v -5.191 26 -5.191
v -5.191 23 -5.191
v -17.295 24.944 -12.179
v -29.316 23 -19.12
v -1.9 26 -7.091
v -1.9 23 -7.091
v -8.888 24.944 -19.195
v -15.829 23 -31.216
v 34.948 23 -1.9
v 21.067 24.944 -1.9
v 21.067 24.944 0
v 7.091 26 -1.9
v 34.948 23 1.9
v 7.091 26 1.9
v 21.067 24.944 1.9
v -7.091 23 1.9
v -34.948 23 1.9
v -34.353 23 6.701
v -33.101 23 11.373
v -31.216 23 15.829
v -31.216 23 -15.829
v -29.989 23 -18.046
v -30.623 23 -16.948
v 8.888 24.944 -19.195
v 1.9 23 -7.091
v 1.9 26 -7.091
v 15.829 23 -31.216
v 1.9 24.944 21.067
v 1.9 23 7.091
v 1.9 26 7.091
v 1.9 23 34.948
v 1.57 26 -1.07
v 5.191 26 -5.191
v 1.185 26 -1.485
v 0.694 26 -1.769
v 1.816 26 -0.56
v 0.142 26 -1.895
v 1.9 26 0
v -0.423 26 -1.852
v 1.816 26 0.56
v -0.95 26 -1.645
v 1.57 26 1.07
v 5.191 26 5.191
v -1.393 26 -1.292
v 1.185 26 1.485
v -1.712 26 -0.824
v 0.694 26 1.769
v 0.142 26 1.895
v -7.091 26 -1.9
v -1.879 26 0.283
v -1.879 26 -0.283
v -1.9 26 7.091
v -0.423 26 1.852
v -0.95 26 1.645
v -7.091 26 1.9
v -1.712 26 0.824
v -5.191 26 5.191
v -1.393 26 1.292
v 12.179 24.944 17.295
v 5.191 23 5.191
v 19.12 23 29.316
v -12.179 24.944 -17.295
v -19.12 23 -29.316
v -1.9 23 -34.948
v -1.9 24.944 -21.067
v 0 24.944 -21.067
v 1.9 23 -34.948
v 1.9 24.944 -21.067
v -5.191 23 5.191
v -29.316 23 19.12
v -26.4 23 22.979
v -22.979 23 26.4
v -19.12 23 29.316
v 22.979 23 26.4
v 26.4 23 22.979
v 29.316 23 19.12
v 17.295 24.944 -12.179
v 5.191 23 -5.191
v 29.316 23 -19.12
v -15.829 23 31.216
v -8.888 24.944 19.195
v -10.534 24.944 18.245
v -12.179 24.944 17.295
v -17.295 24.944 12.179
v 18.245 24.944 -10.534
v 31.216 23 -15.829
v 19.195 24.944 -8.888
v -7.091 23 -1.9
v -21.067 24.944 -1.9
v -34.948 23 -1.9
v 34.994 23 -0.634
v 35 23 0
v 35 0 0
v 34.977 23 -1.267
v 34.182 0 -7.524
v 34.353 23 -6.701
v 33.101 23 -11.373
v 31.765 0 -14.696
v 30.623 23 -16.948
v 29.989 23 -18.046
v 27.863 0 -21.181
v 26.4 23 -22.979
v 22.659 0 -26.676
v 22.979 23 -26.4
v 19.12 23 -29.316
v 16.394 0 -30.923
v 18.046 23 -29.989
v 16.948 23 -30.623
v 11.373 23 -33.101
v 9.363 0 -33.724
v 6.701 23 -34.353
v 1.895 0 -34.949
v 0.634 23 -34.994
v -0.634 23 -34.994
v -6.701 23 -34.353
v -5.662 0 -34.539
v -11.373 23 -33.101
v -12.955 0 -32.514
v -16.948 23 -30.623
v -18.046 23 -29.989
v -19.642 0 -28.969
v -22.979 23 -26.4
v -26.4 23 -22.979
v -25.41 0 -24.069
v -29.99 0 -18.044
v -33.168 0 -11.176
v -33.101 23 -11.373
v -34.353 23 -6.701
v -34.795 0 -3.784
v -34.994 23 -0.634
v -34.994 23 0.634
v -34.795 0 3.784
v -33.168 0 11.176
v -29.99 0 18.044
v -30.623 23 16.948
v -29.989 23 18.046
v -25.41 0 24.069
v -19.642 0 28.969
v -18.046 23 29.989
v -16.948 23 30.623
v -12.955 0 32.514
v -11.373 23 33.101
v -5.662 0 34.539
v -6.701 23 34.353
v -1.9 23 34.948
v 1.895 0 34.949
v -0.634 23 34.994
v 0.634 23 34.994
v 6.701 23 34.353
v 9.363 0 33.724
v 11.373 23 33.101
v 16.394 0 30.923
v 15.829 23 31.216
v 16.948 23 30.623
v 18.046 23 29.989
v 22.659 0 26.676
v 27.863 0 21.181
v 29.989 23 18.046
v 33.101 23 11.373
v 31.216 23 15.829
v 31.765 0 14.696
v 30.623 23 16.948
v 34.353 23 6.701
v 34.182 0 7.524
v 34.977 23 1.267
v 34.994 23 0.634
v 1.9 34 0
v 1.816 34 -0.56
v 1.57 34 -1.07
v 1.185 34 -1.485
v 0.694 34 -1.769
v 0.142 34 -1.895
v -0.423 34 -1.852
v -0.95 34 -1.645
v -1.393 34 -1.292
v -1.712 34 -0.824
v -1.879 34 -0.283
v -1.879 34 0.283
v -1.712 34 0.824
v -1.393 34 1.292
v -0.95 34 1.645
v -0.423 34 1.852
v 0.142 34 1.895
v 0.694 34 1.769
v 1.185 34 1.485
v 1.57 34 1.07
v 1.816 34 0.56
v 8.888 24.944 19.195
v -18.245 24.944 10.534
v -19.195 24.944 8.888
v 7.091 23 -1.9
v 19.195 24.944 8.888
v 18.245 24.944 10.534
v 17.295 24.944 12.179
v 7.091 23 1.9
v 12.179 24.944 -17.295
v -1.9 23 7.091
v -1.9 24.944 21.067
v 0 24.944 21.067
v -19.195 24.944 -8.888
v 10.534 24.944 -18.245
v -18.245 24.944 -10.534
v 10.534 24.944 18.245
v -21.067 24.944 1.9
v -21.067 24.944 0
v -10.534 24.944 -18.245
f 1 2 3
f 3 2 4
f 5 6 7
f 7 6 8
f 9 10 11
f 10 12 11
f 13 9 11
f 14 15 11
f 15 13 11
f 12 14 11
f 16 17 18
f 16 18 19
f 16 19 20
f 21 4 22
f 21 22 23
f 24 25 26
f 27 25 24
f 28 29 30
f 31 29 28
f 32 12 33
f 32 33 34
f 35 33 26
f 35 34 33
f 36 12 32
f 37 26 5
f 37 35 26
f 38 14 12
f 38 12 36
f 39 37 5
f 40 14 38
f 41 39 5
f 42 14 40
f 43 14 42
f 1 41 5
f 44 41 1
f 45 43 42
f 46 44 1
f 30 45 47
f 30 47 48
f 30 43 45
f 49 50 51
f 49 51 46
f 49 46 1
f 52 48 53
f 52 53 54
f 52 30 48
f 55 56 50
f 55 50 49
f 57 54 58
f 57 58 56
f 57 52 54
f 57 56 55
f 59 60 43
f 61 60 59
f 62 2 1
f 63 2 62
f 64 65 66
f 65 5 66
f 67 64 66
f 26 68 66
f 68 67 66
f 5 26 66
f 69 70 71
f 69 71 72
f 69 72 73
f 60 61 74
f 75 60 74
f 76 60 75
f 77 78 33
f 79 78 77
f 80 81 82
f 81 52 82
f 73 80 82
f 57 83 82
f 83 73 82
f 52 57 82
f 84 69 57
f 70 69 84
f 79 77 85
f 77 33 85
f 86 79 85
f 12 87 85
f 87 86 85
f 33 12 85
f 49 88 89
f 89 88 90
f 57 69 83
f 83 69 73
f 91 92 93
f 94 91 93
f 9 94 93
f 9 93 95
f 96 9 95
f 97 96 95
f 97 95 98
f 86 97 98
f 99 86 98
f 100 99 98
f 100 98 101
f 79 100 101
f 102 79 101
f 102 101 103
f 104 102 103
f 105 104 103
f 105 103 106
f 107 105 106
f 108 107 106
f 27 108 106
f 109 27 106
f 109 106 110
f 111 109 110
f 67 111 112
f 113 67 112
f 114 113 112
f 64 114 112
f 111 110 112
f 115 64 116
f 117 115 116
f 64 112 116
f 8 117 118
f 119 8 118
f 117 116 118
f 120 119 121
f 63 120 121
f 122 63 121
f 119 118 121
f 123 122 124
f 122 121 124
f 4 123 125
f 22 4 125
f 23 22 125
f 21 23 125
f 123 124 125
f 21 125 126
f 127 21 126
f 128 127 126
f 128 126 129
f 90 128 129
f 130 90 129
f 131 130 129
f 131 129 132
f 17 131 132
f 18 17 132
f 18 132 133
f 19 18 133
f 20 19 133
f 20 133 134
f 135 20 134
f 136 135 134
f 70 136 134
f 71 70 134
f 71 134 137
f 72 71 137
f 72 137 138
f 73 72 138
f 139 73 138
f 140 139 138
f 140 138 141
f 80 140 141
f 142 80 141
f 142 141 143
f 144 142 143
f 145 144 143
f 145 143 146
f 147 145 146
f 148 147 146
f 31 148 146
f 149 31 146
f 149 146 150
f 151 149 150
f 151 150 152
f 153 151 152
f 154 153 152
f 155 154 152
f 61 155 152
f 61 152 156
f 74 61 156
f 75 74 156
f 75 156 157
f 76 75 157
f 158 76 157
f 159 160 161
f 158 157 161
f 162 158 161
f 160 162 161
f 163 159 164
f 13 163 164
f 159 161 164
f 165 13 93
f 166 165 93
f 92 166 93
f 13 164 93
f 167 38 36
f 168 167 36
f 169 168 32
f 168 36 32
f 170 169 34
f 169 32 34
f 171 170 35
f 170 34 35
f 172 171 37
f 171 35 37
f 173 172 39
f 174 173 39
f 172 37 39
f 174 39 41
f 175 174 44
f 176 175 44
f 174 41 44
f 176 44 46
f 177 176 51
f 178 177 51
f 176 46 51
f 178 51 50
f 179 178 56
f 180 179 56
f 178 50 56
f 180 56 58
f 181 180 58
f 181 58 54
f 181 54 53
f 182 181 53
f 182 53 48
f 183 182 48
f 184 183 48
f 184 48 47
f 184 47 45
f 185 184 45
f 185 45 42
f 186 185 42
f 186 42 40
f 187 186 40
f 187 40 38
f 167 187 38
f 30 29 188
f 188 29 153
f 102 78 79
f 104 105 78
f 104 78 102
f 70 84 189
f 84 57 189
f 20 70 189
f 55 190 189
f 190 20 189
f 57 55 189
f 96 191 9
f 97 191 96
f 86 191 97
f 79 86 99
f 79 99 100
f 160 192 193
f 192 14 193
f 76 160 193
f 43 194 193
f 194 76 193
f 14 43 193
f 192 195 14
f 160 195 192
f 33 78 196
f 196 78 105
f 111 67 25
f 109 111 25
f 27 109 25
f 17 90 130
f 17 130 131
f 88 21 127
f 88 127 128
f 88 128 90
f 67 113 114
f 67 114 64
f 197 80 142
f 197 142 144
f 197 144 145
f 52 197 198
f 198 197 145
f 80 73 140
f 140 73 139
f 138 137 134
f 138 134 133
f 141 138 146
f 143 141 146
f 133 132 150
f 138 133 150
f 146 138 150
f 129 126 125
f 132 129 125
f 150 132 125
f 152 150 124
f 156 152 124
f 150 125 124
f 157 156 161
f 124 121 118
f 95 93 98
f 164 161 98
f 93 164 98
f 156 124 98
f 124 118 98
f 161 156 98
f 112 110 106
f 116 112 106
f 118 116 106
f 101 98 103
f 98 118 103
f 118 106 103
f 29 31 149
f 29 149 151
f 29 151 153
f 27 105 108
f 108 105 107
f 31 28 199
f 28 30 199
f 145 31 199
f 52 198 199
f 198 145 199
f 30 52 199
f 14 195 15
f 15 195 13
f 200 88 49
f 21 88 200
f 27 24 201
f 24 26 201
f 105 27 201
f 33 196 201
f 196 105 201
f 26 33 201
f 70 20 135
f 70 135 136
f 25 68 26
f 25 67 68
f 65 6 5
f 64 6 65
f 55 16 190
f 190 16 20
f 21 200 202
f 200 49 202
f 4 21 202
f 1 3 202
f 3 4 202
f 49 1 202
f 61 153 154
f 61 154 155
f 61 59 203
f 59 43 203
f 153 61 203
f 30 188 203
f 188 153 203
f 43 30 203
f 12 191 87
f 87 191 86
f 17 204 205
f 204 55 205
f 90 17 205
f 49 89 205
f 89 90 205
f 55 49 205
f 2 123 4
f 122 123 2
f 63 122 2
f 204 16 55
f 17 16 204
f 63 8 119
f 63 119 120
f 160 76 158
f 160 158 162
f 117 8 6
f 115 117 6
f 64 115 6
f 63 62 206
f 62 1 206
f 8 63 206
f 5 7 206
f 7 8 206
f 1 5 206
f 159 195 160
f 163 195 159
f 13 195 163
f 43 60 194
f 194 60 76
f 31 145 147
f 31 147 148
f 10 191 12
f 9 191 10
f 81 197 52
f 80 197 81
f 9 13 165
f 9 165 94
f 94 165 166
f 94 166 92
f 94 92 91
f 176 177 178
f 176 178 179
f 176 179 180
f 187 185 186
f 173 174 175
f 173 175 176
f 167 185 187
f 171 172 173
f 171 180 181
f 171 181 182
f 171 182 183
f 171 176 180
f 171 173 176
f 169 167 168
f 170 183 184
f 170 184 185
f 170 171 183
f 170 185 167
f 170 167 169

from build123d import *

# Parameters (mm, degrees)
SKETCH_1_R               = 35
EXTRUDE_1_DEPTH          = 23
SKETCH_2_R               = 1.9
EXTRUDE_2_DEPTH          = 11
SKETCH_4_W               = 3.8
SKETCH_4_H               = 34.948390521
EXTRUDE_6_DEPTH          = 3
PATTERN_CIRCULAR_1_COUNT = 12
CUT_EXTRUDE_3_DEPTH      = 4
PATTERN_CIRCULAR_2_COUNT = 12


with BuildPart() as part:
    # Эскиз1 → Бобышка-Вытянуть1 (new body)
    with BuildSketch(Plane(origin=(0, 0, 0), x_dir=(1, 0, 0), z_dir=(0, 1, 0))):
        Circle(SKETCH_1_R)
    extrude(amount=EXTRUDE_1_DEPTH)

    # Эскиз2 → Бобышка-Вытянуть2 (add)
    with BuildSketch(Plane(origin=(0, 23, 0), x_dir=(1, 0, 0), z_dir=(0, 1, 0))):
        Circle(SKETCH_2_R)
    extrude(amount=EXTRUDE_2_DEPTH)

    # Эскиз4 → Бобышка-Вытянуть6 (add)
    with BuildSketch(Plane(origin=(0, 23, 0), x_dir=(1, 0, 0), z_dir=(0, 1, 0))):
        with Locations((0, 17.474195261)):
            Rectangle(SKETCH_4_W, SKETCH_4_H)
    extrude_6 = extrude(amount=EXTRUDE_6_DEPTH)

    # Круговой массив1: Бобышка-Вытянуть6 ×12 about axis
    pattern_circular_1_axis = Axis((0, 0, 0), (0, 1, 0))
    for i in range(1, PATTERN_CIRCULAR_1_COUNT):
        add(extrude_6.rotate(pattern_circular_1_axis, i * 360 / PATTERN_CIRCULAR_1_COUNT))

    # Эскиз12 → Вырез-Вытянуть3 (cut)
    with BuildSketch(Plane(origin=(-0.95, 0, 1.645448267), x_dir=(0.866025404, 0, 0.5), z_dir=(-0.5, 0, 0.866025404))):
        with BuildLine():
            add(Edge.make_bspline(
                [(-34.948390521, 23), (-21.115111168, 25.388771588), (-7.090896534, 26)],
                knots=[0, 0, 0, 1, 1, 1], degree=2))
            Line((-7.090896534, 26), (-34.948390521, 26))
            Line((-34.948390521, 26), (-34.948390521, 23))
        make_face()
    cut_extrude_3 = extrude(amount=-CUT_EXTRUDE_3_DEPTH, mode=Mode.SUBTRACT)

    # Круговой массив2: Вырез-Вытянуть3 ×12 about axis
    pattern_circular_2_axis = Axis((0, 0, 0), (0, -1, 0))
    for i in range(1, PATTERN_CIRCULAR_2_COUNT):
        add(cut_extrude_3.rotate(pattern_circular_2_axis, i * 360 / PATTERN_CIRCULAR_2_COUNT), mode=Mode.SUBTRACT)


solid = part.part
